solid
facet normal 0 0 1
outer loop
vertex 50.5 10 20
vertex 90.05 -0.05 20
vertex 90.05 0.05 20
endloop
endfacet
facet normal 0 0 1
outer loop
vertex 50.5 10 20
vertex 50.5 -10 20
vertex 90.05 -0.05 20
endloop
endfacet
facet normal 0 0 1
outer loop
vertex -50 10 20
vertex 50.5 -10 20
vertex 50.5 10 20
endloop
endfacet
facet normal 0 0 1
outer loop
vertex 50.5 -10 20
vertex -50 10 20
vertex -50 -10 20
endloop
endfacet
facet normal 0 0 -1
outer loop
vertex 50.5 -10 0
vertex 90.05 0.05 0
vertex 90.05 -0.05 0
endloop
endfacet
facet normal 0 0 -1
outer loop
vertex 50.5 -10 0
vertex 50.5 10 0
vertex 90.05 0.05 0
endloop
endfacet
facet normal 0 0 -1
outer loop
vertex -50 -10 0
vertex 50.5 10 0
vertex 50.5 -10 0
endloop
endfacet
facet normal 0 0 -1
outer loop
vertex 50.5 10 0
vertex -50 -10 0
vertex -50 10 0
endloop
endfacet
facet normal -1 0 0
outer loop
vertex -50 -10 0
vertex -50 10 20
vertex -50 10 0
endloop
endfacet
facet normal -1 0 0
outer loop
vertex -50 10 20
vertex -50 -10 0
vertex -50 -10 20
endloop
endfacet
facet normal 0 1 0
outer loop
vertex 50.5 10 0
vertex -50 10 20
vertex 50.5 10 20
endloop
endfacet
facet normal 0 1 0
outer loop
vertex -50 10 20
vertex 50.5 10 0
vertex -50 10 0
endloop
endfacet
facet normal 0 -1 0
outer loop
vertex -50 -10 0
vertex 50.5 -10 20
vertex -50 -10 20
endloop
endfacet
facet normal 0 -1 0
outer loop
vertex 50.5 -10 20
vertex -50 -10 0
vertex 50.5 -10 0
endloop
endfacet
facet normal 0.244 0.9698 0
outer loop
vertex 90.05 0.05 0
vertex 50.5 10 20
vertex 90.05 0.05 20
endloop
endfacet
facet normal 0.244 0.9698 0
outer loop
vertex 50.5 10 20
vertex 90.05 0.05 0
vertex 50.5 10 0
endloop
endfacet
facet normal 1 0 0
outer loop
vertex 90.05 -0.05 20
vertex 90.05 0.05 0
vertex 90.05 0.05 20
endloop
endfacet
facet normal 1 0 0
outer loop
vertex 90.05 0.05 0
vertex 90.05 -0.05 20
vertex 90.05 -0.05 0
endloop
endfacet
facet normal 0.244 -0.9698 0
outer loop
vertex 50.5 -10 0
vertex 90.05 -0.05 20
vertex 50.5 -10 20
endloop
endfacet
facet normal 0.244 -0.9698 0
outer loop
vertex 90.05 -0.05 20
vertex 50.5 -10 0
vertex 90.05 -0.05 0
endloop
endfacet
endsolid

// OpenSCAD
// [FL_INDEX: keywords="openscad, 3d_parametric, Libre_parameteric_chisel, csg_solid" | COT="Parametric OpenSCAD design from 3DCodeverse"]
// Title: Libre parameteric chisel

//open source chissel

//Length of chissel handle
L=100; //[0:200]

// Length of tip
t= 40; //[0:100]

//Width of chissel handle
w=20; //[0:50]

//Height of chissel handle
h=20; //[0:20]

// Minimum printing step height
a=0.1; //

translate([0,0,w/2])

union(){
cube([L,h,w], center=true);
hull(){
translate([L/2,0,0])cube([1,h,w], center=true);
rotate([0,90,90])translate([0,-t-L/2,0])cube([w,a,a], center=true);
}
}
